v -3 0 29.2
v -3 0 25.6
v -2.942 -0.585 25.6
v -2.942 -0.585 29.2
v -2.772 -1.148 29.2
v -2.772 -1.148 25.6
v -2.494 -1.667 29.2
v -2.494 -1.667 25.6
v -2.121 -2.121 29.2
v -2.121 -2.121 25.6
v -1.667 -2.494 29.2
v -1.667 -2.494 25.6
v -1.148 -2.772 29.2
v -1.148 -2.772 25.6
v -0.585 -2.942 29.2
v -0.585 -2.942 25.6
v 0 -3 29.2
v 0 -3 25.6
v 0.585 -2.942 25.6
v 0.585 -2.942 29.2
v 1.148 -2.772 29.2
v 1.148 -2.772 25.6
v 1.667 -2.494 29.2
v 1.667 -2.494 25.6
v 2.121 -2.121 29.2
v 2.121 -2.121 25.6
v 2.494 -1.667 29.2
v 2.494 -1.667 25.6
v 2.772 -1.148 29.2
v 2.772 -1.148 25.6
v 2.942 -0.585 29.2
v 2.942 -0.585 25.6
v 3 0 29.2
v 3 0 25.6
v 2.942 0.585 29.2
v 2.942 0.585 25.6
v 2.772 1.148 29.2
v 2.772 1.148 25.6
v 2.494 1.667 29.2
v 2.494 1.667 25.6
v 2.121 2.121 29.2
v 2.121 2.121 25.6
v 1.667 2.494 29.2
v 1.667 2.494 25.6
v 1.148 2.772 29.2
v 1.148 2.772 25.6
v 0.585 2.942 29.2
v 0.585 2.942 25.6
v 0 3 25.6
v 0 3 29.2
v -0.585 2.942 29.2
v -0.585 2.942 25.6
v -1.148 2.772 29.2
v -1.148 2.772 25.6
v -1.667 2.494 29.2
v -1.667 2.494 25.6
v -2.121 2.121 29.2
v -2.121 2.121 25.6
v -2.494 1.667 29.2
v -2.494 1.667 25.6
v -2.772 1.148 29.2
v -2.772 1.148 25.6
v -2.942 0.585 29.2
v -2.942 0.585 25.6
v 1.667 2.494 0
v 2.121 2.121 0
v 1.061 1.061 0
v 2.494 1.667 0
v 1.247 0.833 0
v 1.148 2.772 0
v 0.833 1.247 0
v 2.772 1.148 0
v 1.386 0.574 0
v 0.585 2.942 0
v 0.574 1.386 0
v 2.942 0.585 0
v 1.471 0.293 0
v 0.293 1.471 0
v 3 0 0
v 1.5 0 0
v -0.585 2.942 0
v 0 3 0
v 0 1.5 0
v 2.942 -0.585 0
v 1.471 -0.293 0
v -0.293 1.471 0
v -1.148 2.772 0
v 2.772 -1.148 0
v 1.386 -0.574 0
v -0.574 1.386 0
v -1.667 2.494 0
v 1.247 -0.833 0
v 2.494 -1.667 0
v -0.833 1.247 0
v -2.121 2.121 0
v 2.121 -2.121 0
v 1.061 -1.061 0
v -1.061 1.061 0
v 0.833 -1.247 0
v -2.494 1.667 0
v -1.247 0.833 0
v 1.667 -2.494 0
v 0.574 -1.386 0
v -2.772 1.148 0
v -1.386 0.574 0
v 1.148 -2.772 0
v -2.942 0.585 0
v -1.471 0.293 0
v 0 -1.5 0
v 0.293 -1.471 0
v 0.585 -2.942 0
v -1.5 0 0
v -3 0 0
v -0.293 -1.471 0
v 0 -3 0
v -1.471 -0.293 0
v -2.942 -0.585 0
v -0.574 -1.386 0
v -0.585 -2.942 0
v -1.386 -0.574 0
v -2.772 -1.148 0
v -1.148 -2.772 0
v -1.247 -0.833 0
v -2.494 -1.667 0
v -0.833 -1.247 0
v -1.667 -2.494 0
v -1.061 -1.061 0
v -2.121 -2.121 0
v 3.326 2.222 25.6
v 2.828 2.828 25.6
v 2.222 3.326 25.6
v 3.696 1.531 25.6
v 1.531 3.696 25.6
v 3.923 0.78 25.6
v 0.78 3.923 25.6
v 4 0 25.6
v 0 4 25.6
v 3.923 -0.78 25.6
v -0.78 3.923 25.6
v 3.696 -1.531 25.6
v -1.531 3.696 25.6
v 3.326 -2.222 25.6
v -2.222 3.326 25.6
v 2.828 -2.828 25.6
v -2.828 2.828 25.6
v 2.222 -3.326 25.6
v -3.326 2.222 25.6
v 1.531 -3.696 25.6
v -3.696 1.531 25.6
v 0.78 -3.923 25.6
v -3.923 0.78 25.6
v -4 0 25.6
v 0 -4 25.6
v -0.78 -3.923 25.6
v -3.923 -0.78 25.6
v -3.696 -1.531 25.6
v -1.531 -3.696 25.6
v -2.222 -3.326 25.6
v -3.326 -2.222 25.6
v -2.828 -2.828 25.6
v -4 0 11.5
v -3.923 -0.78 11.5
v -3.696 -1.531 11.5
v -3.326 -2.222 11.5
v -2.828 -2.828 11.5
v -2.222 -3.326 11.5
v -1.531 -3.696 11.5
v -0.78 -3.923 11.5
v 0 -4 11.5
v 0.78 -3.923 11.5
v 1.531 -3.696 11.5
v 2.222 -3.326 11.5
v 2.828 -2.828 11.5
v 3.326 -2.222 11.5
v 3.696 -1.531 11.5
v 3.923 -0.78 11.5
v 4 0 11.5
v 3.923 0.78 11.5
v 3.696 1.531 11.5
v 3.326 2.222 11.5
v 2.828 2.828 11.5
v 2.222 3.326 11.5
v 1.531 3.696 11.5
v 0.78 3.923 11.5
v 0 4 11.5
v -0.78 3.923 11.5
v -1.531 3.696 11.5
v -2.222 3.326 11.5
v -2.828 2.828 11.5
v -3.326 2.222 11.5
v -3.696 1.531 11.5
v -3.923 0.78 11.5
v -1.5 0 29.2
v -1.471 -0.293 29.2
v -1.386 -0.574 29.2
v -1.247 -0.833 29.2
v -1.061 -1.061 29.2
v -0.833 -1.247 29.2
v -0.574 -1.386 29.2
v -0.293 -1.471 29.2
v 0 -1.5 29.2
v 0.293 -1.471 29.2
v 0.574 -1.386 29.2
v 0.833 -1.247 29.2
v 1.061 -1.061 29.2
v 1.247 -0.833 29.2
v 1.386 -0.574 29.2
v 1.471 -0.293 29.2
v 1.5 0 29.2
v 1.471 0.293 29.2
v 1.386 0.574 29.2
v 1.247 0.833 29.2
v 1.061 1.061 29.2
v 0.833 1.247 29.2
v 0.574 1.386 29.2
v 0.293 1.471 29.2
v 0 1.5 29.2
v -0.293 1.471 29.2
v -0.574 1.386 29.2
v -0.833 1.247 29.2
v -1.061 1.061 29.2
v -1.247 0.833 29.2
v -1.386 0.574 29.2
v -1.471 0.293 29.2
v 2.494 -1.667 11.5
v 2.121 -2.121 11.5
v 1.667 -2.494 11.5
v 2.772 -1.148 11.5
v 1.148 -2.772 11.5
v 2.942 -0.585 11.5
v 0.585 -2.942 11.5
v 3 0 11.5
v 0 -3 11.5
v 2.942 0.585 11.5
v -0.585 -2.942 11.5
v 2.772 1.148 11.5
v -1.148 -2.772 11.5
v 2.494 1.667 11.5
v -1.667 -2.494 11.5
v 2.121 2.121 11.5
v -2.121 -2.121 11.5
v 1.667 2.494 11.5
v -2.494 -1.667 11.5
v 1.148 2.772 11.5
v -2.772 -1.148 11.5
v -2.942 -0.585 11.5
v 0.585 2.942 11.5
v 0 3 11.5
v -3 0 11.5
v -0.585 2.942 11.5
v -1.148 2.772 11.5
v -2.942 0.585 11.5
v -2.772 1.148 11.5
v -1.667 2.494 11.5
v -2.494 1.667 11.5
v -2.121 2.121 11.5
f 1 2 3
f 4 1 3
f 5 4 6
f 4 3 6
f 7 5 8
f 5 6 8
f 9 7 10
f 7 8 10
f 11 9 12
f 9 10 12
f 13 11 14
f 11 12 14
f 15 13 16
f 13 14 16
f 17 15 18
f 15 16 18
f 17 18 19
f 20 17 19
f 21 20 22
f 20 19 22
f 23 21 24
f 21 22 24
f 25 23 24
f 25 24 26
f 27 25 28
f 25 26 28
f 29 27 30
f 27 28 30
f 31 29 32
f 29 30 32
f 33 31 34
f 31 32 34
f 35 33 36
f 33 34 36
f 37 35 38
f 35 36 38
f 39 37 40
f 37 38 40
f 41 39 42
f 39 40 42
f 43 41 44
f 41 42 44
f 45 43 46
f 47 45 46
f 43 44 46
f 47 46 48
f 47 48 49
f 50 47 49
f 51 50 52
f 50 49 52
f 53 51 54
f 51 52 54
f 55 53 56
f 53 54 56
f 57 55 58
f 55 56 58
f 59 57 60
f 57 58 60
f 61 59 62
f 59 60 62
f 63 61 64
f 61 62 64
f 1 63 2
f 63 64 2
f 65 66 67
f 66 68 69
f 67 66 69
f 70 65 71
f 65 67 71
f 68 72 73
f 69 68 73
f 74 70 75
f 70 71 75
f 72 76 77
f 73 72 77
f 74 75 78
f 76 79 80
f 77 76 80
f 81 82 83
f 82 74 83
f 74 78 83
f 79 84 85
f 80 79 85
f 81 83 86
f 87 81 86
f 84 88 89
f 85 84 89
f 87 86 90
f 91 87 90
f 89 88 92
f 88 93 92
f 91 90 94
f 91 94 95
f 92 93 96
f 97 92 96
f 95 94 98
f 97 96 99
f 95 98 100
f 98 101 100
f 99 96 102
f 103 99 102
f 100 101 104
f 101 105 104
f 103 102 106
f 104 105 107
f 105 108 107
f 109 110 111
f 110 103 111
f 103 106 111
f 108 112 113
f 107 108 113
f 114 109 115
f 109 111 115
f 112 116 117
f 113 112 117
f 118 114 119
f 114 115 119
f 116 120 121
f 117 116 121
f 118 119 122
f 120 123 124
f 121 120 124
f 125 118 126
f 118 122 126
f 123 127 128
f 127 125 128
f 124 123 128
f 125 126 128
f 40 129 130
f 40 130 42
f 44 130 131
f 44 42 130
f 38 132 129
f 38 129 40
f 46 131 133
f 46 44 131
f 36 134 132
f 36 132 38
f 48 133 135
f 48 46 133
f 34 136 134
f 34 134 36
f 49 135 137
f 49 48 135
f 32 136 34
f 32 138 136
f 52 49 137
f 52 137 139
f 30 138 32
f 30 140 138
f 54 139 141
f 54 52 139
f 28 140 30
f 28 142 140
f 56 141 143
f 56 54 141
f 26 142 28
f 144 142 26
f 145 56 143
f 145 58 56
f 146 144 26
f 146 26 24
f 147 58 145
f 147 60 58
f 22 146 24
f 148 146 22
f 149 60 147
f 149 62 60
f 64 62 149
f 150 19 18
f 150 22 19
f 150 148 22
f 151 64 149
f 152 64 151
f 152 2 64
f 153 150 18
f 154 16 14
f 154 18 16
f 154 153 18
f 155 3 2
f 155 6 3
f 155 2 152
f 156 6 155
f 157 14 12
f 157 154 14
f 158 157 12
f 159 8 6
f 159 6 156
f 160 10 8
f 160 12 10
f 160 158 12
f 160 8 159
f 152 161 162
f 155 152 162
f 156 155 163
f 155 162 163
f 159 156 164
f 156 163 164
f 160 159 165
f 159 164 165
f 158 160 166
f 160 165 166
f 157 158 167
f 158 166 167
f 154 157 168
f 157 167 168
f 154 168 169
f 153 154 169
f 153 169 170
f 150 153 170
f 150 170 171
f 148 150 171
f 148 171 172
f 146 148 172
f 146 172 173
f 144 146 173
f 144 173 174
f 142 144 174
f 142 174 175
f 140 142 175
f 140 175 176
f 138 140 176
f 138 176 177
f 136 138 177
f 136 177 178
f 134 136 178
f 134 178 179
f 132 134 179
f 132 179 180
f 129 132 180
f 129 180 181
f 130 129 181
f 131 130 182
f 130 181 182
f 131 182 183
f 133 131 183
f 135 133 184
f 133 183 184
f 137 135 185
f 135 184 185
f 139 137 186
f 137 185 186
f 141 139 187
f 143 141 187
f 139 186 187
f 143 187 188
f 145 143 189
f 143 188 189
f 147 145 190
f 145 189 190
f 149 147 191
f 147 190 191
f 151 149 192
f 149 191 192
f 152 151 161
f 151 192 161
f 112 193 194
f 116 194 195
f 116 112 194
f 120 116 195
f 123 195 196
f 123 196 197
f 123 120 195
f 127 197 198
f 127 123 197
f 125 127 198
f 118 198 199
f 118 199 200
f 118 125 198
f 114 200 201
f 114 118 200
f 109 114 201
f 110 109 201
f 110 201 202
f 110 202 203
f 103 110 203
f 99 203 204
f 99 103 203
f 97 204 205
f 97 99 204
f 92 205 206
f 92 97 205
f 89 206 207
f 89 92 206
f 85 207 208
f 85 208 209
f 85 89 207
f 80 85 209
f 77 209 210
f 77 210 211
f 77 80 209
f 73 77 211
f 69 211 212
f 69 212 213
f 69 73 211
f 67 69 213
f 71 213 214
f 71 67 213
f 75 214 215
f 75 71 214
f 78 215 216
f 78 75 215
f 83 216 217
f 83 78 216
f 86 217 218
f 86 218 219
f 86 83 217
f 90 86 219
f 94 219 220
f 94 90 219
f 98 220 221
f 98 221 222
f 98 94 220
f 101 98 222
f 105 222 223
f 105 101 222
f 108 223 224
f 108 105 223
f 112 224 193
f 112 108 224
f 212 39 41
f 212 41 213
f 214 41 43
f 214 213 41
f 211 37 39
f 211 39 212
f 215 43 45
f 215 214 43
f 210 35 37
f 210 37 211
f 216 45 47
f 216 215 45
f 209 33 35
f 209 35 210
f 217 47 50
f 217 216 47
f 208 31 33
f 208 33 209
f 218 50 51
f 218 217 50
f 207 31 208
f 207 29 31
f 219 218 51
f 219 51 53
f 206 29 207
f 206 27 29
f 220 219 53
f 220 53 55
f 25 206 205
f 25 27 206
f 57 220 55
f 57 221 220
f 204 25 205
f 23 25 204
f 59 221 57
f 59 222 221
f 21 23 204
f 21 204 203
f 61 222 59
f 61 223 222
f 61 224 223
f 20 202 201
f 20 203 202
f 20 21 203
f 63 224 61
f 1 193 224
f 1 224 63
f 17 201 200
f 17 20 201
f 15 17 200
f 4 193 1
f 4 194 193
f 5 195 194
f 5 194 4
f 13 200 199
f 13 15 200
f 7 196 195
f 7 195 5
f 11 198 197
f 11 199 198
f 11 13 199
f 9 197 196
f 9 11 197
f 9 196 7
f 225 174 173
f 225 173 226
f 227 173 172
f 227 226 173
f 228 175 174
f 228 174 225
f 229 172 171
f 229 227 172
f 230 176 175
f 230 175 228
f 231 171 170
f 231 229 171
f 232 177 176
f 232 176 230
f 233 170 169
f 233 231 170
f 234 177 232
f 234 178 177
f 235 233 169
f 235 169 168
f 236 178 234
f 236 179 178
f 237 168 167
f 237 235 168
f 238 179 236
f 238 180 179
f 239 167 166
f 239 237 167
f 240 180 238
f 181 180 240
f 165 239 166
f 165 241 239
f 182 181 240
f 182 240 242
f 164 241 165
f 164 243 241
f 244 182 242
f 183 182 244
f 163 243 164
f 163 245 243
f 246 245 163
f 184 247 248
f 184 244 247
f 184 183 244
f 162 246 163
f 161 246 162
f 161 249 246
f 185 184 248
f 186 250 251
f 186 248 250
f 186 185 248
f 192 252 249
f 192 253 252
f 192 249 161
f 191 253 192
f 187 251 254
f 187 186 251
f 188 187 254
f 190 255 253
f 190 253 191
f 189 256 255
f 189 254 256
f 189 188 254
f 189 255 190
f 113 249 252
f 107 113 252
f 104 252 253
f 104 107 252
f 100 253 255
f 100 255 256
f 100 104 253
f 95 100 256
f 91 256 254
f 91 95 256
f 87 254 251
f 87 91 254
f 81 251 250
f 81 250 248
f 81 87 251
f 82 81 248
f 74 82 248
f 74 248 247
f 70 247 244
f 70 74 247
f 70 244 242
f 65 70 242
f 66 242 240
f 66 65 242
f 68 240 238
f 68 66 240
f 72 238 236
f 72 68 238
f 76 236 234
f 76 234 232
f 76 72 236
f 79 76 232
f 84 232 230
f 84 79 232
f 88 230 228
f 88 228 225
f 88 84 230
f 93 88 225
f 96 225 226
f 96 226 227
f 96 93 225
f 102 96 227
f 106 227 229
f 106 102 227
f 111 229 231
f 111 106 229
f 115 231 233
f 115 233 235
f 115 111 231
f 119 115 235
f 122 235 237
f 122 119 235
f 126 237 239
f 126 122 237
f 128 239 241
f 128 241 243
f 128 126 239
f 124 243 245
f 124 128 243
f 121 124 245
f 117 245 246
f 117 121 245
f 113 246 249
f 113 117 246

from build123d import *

# Parameters (mm, degrees)
SKETCH_1_R          = 4
SKETCH_1_R_2        = 1.5
EXTRUDE_3_DEPTH     = 29.2
SKETCH_3_R          = 4
SKETCH_3_R_2        = 3
CUT_EXTRUDE_1_DEPTH = 11.5
CUT_EXTRUDE_START   = -3.6
SKETCH_4_R          = 4
SKETCH_4_R_2        = 3
CUT_EXTRUDE_2_DEPTH = 3.6


with BuildPart() as part:
    # ｽｹｯﾁ1 → ﾎﾞｽ - 押し出し3 (new body)
    with BuildSketch(Plane.XY):
        with Locations(Location((0, 0, 0), (0, 0, 180))):
            Circle(SKETCH_1_R)
        with Locations(Location((0, 0, 0), (0, 0, 180))):
            Circle(SKETCH_1_R_2, mode=Mode.SUBTRACT)
    extrude(amount=EXTRUDE_3_DEPTH)

    # ｽｹｯﾁ3 → ｶｯﾄ - 押し出し1 (cut)
    with BuildSketch(Plane(origin=(0, 0, 0), x_dir=(-1, 0, 0), z_dir=(0, 0, -1))):
        Circle(SKETCH_3_R)
        Circle(SKETCH_3_R_2, mode=Mode.SUBTRACT)
    extrude(amount=-CUT_EXTRUDE_1_DEPTH, mode=Mode.SUBTRACT)

    # ｽｹｯﾁ4 → ｶｯﾄ - 押し出し2 (cut)
    with BuildSketch(Plane.XY.offset(29.2).offset(CUT_EXTRUDE_START)):
        with Locations(Location((0, 0, 0), (0, 0, 180))):
            Circle(SKETCH_4_R)
        with Locations(Location((0, 0, 0), (0, 0, 180))):
            Circle(SKETCH_4_R_2, mode=Mode.SUBTRACT)
    extrude(amount=CUT_EXTRUDE_2_DEPTH, mode=Mode.SUBTRACT)


solid = part.part
